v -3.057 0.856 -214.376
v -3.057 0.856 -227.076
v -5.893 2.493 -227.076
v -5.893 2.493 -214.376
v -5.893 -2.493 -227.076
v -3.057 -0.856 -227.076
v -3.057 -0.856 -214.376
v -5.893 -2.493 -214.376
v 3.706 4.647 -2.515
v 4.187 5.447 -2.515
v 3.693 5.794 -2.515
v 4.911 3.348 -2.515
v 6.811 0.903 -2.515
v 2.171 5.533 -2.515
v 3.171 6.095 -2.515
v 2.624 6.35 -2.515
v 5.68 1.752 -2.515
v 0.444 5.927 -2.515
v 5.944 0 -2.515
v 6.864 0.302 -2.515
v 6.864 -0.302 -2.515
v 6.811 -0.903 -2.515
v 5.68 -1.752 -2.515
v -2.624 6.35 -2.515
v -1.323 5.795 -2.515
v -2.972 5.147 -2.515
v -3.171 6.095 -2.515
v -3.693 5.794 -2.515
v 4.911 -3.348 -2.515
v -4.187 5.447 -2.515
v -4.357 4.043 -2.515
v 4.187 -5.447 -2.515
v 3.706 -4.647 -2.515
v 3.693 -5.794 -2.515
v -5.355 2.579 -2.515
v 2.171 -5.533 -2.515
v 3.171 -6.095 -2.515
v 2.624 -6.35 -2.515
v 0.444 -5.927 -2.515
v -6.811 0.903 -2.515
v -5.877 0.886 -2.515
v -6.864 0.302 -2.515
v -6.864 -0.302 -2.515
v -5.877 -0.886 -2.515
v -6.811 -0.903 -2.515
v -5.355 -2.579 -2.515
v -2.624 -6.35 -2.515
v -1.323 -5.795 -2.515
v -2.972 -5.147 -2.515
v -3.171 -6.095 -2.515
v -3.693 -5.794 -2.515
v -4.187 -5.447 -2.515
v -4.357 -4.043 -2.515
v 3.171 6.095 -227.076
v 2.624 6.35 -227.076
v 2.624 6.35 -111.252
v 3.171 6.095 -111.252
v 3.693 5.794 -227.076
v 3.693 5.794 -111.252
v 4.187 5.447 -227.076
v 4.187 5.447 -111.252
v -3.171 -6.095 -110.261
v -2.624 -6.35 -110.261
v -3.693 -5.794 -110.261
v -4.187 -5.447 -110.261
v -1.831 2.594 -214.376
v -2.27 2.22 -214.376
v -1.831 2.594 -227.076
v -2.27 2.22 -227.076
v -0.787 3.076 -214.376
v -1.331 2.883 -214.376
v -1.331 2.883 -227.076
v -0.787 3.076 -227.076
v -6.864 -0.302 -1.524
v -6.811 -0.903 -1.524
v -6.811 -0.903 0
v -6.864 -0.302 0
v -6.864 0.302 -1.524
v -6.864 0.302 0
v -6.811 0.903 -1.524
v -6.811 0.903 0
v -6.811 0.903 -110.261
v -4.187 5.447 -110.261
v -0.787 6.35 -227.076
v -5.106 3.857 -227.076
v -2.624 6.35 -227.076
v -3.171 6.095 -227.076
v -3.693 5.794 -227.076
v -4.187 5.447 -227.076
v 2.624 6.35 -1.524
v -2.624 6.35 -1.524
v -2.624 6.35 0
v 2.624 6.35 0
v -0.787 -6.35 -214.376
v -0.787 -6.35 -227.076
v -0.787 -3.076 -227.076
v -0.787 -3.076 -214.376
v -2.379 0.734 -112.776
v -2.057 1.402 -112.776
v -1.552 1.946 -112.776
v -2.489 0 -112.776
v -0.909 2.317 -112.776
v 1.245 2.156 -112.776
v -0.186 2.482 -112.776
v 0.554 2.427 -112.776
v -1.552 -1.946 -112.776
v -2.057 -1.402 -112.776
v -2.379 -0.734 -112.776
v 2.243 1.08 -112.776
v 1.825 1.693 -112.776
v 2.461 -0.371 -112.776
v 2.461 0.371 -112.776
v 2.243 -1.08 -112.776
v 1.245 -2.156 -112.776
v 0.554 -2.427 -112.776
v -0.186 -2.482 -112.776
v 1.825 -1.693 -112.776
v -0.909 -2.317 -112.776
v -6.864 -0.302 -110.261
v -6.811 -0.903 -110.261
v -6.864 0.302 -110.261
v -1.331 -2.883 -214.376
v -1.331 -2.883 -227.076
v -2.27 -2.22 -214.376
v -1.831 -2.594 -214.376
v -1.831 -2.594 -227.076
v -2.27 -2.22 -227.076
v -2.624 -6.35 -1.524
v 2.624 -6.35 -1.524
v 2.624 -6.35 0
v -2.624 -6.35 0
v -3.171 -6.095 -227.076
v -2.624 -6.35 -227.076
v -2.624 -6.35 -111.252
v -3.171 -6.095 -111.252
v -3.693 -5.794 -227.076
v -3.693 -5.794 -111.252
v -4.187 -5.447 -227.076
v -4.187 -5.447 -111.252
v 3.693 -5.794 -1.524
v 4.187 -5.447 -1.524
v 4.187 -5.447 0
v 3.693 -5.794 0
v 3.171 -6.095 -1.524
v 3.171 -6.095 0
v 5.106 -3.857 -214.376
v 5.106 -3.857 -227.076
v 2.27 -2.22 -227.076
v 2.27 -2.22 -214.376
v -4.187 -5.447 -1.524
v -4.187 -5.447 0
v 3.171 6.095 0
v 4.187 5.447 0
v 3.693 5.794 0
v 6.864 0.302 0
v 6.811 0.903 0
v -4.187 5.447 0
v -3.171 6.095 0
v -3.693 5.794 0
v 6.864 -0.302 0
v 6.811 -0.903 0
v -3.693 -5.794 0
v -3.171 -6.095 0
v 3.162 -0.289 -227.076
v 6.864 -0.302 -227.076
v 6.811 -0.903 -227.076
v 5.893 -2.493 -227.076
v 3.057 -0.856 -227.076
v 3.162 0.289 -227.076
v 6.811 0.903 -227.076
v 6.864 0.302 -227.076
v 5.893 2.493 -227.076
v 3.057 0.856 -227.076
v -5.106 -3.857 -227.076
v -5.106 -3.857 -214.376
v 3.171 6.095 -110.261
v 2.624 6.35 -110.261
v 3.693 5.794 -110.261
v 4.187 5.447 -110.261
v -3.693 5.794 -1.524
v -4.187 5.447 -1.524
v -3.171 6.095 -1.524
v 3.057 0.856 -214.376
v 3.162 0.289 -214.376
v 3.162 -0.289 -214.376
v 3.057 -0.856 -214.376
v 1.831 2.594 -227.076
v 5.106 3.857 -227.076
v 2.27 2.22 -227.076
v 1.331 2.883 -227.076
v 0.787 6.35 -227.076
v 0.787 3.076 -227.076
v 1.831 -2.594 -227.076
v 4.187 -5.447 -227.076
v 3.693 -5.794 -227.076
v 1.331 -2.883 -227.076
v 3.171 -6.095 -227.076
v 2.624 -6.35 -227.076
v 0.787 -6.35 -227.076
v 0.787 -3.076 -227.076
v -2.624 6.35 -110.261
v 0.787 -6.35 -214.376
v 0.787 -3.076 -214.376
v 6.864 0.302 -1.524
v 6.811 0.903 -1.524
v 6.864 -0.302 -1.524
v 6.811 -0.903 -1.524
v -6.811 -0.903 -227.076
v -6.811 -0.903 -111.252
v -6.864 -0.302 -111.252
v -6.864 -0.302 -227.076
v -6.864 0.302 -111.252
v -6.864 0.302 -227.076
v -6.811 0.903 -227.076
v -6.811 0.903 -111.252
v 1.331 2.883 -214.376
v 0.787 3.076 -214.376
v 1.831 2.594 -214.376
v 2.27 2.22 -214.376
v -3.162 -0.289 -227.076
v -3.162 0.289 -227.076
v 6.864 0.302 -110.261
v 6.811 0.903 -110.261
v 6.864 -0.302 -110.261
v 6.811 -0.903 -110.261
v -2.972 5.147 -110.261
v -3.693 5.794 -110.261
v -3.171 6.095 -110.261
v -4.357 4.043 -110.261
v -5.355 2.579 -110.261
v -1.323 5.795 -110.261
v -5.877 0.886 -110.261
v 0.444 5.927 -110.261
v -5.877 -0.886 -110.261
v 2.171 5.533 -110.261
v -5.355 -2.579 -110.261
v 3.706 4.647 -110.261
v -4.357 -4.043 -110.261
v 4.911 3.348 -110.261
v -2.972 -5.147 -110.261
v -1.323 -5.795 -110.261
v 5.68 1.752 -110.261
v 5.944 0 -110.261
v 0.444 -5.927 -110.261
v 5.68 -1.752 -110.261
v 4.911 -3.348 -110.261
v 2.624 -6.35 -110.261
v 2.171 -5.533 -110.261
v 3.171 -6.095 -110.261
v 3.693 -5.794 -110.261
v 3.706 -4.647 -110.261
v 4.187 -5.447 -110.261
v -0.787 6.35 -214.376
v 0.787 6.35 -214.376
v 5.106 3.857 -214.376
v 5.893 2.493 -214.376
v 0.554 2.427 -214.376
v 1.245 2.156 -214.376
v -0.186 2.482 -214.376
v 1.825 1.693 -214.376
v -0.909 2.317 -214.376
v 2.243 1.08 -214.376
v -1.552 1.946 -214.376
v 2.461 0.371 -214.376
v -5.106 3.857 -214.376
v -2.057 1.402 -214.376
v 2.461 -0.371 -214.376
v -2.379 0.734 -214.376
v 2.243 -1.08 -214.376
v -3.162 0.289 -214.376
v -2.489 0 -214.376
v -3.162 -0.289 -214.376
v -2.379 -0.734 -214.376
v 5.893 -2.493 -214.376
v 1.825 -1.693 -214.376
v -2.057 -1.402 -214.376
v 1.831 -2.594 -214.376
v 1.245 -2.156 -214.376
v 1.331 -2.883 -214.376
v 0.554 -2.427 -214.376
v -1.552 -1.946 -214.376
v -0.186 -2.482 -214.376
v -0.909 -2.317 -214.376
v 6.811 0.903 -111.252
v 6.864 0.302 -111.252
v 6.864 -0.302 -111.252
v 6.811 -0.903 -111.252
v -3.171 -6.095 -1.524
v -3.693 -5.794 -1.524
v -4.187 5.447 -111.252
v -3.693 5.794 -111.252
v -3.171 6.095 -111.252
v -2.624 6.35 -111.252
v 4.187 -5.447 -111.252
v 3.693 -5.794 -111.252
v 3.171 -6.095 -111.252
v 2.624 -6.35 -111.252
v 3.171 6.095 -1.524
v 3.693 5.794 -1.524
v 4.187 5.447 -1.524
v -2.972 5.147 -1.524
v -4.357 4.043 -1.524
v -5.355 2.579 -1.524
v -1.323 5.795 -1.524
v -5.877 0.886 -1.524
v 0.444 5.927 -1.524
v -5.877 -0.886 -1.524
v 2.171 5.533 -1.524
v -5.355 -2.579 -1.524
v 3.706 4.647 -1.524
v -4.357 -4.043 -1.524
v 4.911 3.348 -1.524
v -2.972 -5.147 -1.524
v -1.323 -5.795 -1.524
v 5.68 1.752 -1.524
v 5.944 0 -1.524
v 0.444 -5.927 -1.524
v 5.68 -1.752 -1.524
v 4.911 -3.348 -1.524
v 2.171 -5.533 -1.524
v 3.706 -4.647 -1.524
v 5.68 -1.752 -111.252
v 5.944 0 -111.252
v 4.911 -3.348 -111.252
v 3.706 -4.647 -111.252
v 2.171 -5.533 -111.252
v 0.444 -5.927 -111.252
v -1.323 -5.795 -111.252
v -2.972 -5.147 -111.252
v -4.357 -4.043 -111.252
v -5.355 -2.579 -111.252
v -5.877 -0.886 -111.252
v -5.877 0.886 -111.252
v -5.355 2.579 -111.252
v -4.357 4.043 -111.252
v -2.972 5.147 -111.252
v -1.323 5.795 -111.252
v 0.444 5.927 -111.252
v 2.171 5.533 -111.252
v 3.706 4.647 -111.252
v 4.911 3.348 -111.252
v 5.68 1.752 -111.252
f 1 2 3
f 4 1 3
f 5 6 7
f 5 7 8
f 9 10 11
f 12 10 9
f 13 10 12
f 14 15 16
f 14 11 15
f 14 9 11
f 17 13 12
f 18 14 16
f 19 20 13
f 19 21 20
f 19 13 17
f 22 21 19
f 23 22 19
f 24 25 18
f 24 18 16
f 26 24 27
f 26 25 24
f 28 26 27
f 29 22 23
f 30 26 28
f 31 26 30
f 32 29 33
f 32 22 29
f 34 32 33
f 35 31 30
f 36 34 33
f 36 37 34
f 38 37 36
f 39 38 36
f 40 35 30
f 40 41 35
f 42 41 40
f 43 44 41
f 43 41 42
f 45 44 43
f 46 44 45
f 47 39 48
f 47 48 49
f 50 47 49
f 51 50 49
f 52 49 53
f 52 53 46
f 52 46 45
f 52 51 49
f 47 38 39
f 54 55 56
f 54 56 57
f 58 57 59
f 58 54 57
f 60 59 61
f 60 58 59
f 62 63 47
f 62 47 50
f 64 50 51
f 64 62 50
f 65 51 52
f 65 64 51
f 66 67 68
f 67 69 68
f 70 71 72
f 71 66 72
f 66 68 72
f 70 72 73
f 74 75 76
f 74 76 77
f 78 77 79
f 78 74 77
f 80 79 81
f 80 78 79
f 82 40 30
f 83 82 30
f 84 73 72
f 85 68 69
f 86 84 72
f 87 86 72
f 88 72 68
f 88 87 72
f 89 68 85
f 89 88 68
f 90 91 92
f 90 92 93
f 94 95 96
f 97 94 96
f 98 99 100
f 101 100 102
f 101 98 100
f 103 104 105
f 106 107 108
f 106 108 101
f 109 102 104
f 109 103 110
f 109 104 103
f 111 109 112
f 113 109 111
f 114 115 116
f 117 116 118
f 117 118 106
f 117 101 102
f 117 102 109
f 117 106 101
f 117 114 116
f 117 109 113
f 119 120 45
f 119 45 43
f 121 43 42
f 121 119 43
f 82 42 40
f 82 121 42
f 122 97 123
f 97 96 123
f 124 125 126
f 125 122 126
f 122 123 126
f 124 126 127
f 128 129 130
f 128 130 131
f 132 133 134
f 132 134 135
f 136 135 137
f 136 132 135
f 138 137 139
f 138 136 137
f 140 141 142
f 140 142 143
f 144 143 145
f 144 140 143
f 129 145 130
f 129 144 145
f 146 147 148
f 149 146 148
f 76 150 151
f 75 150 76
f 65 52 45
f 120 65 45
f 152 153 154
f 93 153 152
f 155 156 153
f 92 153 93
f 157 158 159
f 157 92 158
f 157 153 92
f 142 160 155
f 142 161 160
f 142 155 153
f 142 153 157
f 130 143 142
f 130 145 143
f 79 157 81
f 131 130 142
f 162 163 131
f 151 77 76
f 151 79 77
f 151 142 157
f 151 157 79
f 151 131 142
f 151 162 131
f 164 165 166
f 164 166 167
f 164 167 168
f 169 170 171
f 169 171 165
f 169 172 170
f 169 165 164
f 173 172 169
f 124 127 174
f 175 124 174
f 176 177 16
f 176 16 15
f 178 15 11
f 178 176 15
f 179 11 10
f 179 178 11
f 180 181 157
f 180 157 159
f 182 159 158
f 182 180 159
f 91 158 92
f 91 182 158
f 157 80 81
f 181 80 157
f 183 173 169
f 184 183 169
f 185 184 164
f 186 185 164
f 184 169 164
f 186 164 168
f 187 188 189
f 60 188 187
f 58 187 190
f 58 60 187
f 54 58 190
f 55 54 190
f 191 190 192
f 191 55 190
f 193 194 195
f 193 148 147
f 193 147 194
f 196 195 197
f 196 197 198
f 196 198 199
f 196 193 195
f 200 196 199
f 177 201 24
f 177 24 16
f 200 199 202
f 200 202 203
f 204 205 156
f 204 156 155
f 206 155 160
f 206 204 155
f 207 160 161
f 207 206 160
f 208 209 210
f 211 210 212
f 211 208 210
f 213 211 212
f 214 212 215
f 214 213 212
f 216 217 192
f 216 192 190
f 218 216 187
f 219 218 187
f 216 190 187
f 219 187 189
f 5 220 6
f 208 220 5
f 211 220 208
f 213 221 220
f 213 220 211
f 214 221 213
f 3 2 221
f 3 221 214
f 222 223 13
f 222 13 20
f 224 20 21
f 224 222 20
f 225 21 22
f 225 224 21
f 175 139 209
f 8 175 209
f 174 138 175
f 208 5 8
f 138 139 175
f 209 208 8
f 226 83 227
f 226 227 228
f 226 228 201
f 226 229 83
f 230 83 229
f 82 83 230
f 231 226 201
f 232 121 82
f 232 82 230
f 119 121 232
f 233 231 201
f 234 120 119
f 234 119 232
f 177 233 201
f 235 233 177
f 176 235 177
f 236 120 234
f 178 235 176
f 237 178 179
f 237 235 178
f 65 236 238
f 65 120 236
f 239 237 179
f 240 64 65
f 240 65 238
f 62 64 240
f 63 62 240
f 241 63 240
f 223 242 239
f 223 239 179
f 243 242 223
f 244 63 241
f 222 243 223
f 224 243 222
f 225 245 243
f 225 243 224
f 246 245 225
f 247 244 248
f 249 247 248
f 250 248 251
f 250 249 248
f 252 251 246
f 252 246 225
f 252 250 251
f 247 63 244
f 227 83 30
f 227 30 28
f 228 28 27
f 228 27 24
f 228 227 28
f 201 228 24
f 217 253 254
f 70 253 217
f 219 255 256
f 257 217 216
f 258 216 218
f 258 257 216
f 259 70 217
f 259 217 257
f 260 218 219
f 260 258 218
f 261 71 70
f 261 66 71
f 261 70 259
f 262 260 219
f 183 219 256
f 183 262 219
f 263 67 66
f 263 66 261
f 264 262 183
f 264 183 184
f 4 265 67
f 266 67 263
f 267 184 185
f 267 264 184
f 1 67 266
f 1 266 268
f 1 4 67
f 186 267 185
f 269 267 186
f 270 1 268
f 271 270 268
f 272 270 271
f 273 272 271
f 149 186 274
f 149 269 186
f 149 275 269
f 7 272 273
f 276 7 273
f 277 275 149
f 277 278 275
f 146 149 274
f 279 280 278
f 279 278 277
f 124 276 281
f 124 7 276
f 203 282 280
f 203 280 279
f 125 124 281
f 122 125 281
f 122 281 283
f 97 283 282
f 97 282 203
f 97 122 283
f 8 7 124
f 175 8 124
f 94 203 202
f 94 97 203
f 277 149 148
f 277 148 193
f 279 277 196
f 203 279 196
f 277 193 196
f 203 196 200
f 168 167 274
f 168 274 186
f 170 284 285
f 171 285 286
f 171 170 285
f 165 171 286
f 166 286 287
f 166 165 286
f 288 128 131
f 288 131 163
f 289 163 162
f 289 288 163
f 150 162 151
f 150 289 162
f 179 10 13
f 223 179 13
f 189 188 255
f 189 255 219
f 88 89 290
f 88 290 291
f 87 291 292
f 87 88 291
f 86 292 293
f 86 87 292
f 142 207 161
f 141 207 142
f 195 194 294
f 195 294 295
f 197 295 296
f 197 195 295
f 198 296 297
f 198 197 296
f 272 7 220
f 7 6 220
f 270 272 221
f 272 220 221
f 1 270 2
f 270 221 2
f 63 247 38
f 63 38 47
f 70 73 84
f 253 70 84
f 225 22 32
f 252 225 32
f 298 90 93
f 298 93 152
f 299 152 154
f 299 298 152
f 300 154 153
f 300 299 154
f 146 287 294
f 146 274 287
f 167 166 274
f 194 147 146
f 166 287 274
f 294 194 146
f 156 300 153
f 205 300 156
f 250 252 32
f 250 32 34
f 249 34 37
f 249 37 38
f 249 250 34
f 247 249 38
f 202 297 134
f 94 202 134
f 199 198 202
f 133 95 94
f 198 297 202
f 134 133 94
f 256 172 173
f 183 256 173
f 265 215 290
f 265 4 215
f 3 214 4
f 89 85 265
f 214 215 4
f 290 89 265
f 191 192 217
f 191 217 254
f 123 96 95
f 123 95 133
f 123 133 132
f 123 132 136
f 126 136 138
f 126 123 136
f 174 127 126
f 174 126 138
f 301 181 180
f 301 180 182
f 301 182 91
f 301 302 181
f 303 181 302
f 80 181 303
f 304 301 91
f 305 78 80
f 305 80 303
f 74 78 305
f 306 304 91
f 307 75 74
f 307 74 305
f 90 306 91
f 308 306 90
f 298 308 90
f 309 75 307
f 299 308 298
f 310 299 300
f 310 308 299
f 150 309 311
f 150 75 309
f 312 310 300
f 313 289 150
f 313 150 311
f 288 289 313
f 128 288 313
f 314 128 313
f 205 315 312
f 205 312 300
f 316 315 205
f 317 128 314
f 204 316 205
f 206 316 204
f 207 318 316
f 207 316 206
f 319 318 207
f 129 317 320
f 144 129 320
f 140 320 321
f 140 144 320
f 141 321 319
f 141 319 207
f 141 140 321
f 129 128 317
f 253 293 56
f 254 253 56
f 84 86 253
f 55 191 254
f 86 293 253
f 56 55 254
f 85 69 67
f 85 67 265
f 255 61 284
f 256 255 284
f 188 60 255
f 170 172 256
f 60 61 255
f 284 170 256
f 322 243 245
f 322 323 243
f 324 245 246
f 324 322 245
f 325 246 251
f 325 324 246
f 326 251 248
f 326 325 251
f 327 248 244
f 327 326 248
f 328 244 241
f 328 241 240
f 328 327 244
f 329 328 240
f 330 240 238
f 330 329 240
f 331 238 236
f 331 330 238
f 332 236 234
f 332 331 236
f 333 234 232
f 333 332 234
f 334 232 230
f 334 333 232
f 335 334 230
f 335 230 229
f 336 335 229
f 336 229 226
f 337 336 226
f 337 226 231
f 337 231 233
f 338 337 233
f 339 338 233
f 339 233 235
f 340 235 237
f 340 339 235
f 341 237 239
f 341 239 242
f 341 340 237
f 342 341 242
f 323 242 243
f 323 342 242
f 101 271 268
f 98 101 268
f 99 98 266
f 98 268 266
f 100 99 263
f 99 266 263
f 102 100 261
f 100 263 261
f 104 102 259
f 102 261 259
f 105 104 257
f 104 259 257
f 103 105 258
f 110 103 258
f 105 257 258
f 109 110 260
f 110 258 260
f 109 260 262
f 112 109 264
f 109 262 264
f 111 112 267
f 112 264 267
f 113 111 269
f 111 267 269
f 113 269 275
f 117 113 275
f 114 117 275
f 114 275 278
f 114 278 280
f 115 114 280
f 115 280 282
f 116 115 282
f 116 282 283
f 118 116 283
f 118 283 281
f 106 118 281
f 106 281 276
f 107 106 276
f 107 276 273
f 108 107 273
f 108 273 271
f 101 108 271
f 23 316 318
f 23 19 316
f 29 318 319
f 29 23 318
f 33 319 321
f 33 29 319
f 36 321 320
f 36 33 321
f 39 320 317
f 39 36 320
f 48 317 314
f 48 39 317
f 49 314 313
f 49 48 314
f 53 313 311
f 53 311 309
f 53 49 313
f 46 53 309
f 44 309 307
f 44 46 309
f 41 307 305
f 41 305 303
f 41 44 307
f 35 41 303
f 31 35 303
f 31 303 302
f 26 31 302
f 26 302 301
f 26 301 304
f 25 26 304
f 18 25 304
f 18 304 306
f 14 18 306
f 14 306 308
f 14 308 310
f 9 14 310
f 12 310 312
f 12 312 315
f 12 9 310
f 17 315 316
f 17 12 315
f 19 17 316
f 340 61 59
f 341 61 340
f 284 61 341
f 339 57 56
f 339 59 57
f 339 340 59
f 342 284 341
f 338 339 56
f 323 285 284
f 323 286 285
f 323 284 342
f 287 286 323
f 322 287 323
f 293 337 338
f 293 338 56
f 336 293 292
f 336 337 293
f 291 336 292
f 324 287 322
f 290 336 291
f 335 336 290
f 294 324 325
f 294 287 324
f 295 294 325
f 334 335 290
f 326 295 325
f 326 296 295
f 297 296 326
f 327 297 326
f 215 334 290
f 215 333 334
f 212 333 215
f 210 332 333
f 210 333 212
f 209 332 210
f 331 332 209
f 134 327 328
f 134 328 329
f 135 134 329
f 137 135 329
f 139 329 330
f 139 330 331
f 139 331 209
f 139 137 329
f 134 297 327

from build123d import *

# Parameters (mm, degrees)
SKETCH2_OUTSIDE_W   = 40.204
SKETCH2_OUTSIDE_H   = 40.204
CUT_EXTRUDE1_DEPTH  = 114.289694924
BOSS_EXTRUDE1_START = 114.3
SKETCH3_R           = 2.4892
BOSS_EXTRUDE1_DEPTH = 114.3
SKETCH4_R           = 3.175
CUT_EXTRUDE2_DEPTH  = 12.7
SKETCH5_W           = 1.5748
SKETCH5_H           = 12.7
CUT_EXTRUDE3_DEPTH  = 12.7
CIRPATTERN1_COUNT   = 6


with BuildPart() as part:
    # Sketch1 → Revolve3 (revolve)
    with BuildSketch(Plane(origin=(0, 0, 0), x_dir=(0, 0, -1), z_dir=(1, 0, 0)), mode=Mode.PRIVATE) as revolve3_sk:
        Polygon((111.252, 7.62), (112.776, 7.62), (112.776, 0), (0, 0), (0, 7.62), (1.524, 7.62), (1.524, 5.9436), (2.5146, 5.9436), (2.5146, 7.62), (110.2614, 7.62), (110.2614, 5.9436), (111.252, 5.9436), align=None)
    revolve(revolve3_sk.sketch.rotate(Axis((0, 0, 0), (0, 0, -1)), 90), axis=Axis((0, 0, 0), (0, 0, -1)))

    # Sketch2 outside → Cut-Extrude1 (cut, through all)
    with BuildSketch(Plane(origin=(0, 0, -112.776), x_dir=(-1, 0, 0), z_dir=(0, 0, -1))):
        Rectangle(SKETCH2_OUTSIDE_W, SKETCH2_OUTSIDE_H)
        with BuildLine():
            Line((6.811131972, 0.902773368), (4.187390656, 5.447226632))
            ThreePointArc((4.187390656, 5.447226632), (3.43535, 5.950200742), (2.623741315, 6.35))
            Line((2.623741315, 6.35), (-2.623741315, 6.35))
            ThreePointArc((-2.623741315, 6.35), (-3.43535, 5.950200742), (-4.187390656, 5.447226632))
            Line((-4.187390656, 5.447226632), (-6.811131972, 0.902773368))
            ThreePointArc((-6.811131972, 0.902773368), (-6.8707, 0), (-6.811131972, -0.902773368))
            Line((-6.811131972, -0.902773368), (-4.187390656, -5.447226632))
            ThreePointArc((-4.187390656, -5.447226632), (-3.43535, -5.950200742), (-2.623741315, -6.35))
            Line((-2.623741315, -6.35), (2.623741315, -6.35))
            ThreePointArc((2.623741315, -6.35), (3.43535, -5.950200742), (4.187390656, -5.447226632))
            Line((4.187390656, -5.447226632), (6.811131972, -0.902773368))
            ThreePointArc((6.811131972, -0.902773368), (6.8707, 0), (6.811131972, 0.902773368))
        make_face(mode=Mode.SUBTRACT)
    extrude(amount=-CUT_EXTRUDE1_DEPTH, mode=Mode.SUBTRACT)

    # Sketch3 → Boss-Extrude1 (add)
    with BuildSketch(Plane(origin=(0, 0, -112.776), x_dir=(-1, 0, 0), z_dir=(0, 0, -1)).offset(BOSS_EXTRUDE1_START)):
        with BuildLine():
            Line((4.187390656, -5.447226632), (6.811131972, -0.902773368))
            ThreePointArc((6.811131972, -0.902773368), (6.8707, 0), (6.811131972, 0.902773368))
            Line((6.811131972, 0.902773368), (4.187390656, 5.447226632))
            ThreePointArc((4.187390656, 5.447226632), (3.43535, 5.950200742), (2.623741315, 6.35))
            Line((2.623741315, 6.35), (-2.623741315, 6.35))
            ThreePointArc((-2.623741315, 6.35), (-3.43535, 5.950200742), (-4.187390656, 5.447226632))
            Line((-4.187390656, 5.447226632), (-6.811131972, 0.902773368))
            ThreePointArc((-6.811131972, 0.902773368), (-6.8707, 0), (-6.811131972, -0.902773368))
            Line((-6.811131972, -0.902773368), (-4.187390656, -5.447226632))
            ThreePointArc((-4.187390656, -5.447226632), (-3.43535, -5.950200742), (-2.623741315, -6.35))
            Line((-2.623741315, -6.35), (2.623741315, -6.35))
            ThreePointArc((2.623741315, -6.35), (3.43535, -5.950200742), (4.187390656, -5.447226632))
        make_face()
        Circle(SKETCH3_R, mode=Mode.SUBTRACT)
    extrude(amount=-BOSS_EXTRUDE1_DEPTH)

    # Sketch4 → Cut-Extrude2 (cut)
    with BuildSketch(Plane(origin=(0, 0, -227.076), x_dir=(-1, 0, 0), z_dir=(0, 0, -1))):
        Circle(SKETCH4_R)
    extrude(amount=-CUT_EXTRUDE2_DEPTH, mode=Mode.SUBTRACT)

    # Sketch5 → Cut-Extrude3 (cut)
    with BuildSketch(Plane(origin=(0, 0, -227.076), x_dir=(-1, 0, 0), z_dir=(0, 0, -1))):
        Rectangle(SKETCH5_W, SKETCH5_H)
    cut_extrude3 = extrude(amount=-CUT_EXTRUDE3_DEPTH, mode=Mode.SUBTRACT)

    # CirPattern1: Cut-Extrude3 ×6 about axis
    cirpattern1_axis = Axis((0, 0, 0), (0, 0, 1))
    for i in range(1, CIRPATTERN1_COUNT):
        add(cut_extrude3.rotate(cirpattern1_axis, i * 360 / CIRPATTERN1_COUNT), mode=Mode.SUBTRACT)


solid = part.part
